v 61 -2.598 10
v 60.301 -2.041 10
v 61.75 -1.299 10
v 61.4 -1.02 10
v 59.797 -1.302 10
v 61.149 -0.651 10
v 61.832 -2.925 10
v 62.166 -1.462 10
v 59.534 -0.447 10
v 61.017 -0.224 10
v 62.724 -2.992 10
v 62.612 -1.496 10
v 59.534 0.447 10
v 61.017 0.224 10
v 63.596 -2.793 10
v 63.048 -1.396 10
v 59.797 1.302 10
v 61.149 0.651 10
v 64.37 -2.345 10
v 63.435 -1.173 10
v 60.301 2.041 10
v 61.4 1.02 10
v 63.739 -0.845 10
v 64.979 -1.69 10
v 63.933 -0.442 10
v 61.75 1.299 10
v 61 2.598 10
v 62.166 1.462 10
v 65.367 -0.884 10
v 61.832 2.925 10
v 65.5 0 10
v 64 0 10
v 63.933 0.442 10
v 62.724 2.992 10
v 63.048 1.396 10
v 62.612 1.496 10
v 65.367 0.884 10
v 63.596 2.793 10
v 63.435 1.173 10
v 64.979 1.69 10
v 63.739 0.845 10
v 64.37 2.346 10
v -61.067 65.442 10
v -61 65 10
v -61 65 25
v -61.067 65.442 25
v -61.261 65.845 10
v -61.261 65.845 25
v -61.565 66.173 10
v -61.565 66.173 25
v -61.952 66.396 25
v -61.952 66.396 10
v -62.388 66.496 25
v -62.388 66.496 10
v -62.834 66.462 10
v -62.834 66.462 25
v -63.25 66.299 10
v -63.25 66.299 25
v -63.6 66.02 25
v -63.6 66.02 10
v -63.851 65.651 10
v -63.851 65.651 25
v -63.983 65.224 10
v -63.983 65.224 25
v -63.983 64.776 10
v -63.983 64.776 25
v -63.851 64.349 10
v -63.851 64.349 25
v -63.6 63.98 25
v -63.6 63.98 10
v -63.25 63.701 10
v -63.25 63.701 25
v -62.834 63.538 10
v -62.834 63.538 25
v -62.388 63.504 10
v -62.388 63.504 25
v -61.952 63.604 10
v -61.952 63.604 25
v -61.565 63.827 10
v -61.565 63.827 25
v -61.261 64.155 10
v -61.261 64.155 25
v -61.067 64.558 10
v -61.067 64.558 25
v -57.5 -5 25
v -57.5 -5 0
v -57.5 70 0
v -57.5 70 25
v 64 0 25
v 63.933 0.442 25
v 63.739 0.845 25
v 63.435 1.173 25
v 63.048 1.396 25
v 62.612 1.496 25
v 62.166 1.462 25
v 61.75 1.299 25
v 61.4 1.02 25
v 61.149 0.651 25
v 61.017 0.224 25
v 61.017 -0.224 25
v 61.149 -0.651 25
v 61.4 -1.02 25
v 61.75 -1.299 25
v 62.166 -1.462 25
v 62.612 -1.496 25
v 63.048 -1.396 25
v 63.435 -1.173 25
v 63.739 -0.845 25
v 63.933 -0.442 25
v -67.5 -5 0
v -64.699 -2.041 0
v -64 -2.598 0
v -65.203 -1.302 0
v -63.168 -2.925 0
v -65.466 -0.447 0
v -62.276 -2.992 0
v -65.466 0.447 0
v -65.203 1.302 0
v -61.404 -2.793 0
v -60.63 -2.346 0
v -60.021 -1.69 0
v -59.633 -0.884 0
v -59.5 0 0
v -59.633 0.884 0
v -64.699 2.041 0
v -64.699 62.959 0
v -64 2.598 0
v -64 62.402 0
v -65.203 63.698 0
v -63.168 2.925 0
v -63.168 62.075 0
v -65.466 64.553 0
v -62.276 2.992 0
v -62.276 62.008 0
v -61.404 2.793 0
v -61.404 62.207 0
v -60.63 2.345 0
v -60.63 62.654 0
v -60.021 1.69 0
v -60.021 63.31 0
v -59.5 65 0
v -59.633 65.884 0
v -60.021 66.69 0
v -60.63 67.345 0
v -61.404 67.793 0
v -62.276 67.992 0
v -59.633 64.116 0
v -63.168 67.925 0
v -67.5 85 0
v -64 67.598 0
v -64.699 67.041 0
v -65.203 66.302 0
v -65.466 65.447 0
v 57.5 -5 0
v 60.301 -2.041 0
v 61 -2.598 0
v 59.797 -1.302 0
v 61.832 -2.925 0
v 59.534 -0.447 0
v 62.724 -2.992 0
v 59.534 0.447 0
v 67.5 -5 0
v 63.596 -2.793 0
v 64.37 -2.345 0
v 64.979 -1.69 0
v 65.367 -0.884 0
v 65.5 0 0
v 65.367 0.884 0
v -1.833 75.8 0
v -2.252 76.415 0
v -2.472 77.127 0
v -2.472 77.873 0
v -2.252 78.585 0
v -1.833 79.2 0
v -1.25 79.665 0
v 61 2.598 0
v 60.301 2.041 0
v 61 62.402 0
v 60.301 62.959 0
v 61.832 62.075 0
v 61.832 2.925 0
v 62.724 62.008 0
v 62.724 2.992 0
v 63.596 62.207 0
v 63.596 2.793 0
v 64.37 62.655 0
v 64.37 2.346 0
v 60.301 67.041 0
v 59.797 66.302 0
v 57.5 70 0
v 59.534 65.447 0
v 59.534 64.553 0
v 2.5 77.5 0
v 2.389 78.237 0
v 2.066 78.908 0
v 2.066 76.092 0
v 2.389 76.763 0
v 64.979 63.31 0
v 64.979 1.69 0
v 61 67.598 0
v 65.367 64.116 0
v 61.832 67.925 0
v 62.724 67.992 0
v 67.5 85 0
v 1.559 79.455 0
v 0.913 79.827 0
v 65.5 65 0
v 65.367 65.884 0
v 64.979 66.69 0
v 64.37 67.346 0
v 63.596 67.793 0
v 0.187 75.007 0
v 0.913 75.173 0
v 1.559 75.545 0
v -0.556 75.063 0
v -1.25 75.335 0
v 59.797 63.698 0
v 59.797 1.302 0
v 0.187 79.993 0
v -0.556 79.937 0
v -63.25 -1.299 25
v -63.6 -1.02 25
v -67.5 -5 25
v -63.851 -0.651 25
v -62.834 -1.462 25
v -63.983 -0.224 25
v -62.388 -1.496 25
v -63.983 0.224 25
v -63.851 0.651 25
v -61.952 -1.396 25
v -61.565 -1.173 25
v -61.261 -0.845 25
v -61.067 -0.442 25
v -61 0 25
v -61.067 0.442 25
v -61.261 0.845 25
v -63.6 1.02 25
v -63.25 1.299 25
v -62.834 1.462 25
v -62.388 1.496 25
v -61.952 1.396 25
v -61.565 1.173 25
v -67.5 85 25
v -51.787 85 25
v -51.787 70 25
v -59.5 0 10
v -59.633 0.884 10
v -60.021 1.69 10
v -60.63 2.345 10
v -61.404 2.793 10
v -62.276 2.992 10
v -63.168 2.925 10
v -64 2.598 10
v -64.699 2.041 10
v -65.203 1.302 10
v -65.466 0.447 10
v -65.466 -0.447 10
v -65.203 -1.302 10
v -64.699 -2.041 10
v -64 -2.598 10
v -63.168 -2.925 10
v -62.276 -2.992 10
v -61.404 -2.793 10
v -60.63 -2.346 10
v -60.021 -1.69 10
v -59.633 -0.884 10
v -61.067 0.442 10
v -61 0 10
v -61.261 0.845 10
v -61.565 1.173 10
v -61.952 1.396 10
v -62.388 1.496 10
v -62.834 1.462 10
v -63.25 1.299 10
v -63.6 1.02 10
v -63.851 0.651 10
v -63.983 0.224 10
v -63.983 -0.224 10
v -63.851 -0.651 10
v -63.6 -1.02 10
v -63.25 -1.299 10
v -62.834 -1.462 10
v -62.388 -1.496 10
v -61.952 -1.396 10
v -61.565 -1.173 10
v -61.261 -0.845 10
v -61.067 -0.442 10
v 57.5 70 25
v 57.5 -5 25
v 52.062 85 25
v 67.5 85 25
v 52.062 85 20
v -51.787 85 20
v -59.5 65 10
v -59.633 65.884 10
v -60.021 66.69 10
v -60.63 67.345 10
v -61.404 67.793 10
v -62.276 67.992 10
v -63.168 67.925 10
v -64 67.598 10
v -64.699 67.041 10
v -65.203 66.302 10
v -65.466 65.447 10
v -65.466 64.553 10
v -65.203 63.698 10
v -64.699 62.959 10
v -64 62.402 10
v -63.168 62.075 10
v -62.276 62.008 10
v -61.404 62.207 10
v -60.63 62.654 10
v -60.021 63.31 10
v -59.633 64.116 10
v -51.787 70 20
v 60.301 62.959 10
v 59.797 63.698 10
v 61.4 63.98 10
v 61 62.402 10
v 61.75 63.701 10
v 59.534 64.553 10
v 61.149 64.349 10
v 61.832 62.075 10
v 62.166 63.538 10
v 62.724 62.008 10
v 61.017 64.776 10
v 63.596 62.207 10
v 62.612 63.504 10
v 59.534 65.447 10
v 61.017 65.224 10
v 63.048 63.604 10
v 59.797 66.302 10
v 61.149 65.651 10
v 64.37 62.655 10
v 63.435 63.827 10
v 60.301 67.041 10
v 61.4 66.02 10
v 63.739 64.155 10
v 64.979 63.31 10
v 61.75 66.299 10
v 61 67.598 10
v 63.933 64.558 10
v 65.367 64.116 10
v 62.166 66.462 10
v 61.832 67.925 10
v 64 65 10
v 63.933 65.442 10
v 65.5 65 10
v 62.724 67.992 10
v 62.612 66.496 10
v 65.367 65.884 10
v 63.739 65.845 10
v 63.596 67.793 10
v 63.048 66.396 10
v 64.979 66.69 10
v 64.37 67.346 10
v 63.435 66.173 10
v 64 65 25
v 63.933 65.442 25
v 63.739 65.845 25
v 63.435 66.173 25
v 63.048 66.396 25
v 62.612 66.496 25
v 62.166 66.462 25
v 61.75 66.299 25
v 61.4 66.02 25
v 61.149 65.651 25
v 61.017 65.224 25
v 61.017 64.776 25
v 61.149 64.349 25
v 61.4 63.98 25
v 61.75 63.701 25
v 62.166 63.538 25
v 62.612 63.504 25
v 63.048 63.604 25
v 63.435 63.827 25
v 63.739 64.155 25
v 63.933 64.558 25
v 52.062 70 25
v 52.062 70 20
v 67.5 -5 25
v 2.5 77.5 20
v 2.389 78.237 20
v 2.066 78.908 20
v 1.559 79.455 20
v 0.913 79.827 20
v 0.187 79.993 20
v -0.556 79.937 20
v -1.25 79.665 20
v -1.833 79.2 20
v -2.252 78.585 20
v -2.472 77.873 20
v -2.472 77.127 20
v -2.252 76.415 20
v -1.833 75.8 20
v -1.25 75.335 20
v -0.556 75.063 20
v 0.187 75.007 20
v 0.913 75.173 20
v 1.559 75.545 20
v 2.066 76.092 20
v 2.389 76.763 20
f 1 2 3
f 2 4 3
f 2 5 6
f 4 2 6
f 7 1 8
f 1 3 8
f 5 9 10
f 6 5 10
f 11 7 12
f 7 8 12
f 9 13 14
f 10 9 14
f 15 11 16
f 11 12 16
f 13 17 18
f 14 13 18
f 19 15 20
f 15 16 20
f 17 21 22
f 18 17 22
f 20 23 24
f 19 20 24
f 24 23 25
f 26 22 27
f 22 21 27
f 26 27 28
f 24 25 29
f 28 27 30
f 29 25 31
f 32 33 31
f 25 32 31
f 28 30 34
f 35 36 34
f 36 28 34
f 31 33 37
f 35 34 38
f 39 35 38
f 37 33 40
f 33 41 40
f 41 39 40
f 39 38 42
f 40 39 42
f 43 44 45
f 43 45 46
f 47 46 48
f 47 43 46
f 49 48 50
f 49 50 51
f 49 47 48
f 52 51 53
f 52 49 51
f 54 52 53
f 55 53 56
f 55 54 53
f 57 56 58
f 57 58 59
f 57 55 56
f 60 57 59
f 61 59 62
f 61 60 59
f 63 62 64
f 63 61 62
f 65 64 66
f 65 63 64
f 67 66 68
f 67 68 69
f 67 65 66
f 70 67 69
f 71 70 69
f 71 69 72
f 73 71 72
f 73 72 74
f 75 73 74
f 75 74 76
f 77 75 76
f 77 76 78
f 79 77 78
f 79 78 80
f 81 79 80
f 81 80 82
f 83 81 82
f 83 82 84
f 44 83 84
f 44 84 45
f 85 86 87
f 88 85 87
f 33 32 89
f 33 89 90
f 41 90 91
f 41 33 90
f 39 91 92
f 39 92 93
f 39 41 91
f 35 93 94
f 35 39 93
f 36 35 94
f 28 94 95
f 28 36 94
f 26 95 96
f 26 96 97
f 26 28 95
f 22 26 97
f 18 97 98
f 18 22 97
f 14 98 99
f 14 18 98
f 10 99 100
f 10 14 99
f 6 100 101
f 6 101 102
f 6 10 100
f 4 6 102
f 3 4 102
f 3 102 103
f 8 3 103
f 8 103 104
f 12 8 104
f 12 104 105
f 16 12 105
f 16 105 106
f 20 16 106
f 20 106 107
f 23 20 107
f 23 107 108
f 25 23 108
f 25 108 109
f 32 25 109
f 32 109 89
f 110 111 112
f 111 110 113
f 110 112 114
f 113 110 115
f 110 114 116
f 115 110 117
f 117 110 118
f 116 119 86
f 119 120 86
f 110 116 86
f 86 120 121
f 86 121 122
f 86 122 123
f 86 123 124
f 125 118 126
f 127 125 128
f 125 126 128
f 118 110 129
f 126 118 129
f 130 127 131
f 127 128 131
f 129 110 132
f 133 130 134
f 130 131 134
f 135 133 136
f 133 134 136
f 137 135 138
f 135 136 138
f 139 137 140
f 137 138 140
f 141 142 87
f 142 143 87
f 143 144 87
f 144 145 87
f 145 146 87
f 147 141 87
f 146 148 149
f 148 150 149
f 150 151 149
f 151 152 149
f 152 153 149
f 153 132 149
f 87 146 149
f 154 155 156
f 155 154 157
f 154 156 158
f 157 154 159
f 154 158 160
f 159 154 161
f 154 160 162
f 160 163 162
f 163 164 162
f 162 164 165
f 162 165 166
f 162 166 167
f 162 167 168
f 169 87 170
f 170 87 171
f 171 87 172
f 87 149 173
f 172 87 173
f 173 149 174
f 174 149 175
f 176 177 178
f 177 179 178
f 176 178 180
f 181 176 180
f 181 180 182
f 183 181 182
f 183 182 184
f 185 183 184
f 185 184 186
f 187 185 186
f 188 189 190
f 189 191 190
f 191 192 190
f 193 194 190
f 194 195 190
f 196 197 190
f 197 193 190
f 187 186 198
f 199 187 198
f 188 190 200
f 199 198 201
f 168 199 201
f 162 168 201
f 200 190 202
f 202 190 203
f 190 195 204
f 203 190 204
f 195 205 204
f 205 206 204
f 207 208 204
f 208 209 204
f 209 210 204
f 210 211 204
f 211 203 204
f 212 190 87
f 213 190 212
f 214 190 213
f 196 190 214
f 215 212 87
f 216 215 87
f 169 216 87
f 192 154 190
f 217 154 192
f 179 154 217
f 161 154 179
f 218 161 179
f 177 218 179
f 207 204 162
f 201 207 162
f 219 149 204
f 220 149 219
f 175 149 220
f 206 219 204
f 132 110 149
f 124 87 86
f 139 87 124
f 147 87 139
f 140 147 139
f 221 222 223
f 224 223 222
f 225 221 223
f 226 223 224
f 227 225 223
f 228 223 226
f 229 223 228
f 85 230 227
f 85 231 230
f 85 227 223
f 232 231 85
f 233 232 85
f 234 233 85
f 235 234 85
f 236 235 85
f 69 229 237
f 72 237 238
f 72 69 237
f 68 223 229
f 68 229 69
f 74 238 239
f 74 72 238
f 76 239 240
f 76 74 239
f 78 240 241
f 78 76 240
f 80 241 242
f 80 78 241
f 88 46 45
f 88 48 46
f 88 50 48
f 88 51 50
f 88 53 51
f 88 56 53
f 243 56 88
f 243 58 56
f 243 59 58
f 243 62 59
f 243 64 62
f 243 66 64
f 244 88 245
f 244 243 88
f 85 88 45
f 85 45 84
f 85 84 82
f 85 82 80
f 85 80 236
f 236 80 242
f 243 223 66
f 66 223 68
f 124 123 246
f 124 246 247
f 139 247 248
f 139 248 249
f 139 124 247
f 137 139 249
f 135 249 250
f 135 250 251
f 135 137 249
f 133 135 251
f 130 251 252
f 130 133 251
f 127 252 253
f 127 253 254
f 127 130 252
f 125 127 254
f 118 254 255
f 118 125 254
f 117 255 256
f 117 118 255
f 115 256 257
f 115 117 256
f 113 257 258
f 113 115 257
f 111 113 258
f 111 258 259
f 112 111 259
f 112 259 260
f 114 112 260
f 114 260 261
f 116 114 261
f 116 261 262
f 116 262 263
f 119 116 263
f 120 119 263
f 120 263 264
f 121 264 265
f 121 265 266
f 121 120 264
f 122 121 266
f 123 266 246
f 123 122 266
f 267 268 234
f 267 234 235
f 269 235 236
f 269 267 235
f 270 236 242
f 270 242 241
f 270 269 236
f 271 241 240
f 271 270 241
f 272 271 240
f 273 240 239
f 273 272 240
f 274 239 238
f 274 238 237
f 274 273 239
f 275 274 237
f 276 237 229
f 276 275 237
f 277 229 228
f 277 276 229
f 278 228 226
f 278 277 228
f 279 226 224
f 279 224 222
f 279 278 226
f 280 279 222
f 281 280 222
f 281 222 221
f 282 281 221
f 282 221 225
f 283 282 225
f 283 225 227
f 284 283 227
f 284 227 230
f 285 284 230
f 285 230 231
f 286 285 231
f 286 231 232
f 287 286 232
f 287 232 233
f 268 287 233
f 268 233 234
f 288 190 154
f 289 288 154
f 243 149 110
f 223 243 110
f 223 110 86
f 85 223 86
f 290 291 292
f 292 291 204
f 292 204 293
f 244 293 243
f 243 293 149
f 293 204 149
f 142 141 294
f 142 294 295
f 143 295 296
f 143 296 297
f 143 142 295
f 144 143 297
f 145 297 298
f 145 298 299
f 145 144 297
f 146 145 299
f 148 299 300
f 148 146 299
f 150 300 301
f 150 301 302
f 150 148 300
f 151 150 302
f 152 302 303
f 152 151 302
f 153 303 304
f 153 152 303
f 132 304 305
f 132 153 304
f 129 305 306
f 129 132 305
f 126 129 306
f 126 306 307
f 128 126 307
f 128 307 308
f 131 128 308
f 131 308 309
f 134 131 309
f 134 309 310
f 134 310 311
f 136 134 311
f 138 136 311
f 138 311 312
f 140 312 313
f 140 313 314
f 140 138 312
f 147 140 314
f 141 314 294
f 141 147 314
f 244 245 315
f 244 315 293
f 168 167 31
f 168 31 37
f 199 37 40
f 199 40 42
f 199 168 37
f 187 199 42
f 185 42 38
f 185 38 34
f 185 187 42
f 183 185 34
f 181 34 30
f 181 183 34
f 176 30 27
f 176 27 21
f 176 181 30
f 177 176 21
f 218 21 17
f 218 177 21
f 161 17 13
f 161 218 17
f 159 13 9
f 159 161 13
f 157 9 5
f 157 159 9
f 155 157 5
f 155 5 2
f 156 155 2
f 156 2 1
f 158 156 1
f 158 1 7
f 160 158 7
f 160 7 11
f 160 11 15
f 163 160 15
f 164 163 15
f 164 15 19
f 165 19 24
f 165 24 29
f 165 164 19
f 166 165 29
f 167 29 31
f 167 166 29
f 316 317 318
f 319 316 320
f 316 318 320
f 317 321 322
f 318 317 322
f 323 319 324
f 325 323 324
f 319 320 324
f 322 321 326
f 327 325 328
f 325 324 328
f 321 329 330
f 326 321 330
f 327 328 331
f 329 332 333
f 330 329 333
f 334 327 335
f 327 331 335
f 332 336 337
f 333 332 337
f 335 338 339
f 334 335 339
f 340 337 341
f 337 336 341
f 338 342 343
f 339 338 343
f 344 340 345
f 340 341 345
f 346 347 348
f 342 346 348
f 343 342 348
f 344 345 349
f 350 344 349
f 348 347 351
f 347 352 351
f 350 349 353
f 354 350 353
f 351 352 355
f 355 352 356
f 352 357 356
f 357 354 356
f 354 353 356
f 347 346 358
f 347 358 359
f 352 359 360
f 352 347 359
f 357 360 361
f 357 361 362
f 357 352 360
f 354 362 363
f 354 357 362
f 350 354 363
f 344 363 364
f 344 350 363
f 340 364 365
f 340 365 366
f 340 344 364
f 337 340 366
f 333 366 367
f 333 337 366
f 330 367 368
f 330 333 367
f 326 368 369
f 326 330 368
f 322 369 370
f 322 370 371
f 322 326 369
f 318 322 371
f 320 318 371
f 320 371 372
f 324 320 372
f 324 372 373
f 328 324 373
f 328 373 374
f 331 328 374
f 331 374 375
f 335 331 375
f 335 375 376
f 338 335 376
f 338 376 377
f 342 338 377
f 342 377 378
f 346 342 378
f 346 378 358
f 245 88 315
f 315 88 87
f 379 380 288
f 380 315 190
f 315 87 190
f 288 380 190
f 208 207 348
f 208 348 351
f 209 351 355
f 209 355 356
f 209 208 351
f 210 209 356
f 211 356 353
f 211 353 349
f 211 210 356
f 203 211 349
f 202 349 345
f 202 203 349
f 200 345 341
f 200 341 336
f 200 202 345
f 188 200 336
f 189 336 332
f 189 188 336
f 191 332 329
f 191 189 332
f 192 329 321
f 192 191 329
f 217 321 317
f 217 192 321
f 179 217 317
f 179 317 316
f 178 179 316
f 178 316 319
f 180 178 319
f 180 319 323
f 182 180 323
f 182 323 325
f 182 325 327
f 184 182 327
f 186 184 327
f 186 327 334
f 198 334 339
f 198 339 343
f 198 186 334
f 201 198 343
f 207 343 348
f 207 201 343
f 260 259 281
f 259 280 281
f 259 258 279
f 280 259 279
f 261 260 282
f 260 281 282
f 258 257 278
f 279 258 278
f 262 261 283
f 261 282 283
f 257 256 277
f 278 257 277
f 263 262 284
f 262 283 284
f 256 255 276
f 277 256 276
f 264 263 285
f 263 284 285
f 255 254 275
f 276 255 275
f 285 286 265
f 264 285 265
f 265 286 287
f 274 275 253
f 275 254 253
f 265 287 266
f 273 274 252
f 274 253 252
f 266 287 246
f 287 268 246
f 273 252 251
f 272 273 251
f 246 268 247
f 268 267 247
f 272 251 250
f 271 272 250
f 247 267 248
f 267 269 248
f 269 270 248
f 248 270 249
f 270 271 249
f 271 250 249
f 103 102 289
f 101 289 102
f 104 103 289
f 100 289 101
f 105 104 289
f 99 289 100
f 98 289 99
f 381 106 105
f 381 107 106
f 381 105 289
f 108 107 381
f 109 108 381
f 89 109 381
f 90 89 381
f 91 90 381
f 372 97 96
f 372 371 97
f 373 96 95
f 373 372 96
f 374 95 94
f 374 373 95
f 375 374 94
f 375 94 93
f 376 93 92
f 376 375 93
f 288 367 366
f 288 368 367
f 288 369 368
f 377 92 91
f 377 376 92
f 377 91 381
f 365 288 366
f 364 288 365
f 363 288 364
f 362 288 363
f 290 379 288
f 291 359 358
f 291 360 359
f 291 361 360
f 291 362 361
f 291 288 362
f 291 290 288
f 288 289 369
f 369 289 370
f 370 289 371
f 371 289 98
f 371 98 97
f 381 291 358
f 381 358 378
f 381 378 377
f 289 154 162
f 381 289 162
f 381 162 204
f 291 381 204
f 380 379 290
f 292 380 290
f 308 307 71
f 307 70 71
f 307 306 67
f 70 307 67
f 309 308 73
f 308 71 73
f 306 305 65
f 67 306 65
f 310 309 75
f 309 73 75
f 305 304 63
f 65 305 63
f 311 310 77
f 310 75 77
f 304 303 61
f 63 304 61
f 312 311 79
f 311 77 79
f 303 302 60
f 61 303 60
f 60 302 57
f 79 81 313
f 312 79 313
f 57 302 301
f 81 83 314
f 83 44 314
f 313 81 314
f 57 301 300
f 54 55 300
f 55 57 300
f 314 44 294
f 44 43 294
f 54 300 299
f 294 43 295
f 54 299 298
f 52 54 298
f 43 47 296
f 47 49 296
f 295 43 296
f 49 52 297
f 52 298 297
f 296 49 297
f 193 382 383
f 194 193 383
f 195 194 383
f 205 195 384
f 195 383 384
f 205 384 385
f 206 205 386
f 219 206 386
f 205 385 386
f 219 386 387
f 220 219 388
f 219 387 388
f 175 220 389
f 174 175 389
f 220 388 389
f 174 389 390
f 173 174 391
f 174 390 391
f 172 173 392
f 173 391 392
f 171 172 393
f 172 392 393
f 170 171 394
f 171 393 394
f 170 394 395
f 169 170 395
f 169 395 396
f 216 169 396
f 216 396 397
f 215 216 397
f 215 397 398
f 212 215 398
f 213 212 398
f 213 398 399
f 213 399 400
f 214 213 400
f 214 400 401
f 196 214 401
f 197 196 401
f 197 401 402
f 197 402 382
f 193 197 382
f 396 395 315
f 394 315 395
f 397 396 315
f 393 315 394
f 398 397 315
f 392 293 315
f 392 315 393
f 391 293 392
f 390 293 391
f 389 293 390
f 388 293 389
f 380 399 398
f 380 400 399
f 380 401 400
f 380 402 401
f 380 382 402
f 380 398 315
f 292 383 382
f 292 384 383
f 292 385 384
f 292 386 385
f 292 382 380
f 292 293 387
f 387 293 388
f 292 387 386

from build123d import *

# Parameters (mm, degrees)
F0_W     = 114.999984
F0_H     = 15
F0_R     = 3
F0_R_2   = 1.5
F1_DEPTH = 25
F2_R     = 2.5
F3_DEPTH = 25
F2_W     = 103.84956
F2_H     = 15
F4_DEPTH = 5
F5_DEPTH = 10


with BuildPart() as f1:
    # F0 (on Top) → F1 (new body)
    with BuildSketch(Plane.XY):
        with Locations((0, 77.500006)):
            Rectangle(F0_W, F0_H)
        Polygon((-57.499992, 70.000006), (-57.499992, 85.000006), (-67.499992, 85.000006), (-67.499992, -4.999994), (-57.499992, -4.999994), align=None)
        with Locations((-62.5, -6e-06)):
            Circle(F0_R, mode=Mode.SUBTRACT)
        with Locations((-62.500006, 64.999994)):
            Circle(F0_R, mode=Mode.SUBTRACT)
        Polygon((67.499992, 85.000006), (57.499992, 85.000006), (57.499992, 70.000006), (57.499992, -4.999994), (67.499992, -4.999994), align=None)
        with Locations((62.5, 6e-06)):
            Circle(F0_R, mode=Mode.SUBTRACT)
        with Locations((62.499994, 65.000006)):
            Circle(F0_R, mode=Mode.SUBTRACT)
        with Locations((62.499994, 65.000006)):
            Circle(F0_R)
        with Locations((62.499994, 65.000006)):
            Circle(F0_R_2, mode=Mode.SUBTRACT)
        with Locations((62.5, 6e-06)):
            Circle(F0_R)
        with Locations((62.5, 6e-06)):
            Circle(F0_R_2, mode=Mode.SUBTRACT)
        with Locations((-62.5, -6e-06)):
            Circle(F0_R)
        with Locations((-62.5, -6e-06)):
            Circle(F0_R_2, mode=Mode.SUBTRACT)
        with Locations((-62.500006, 64.999994)):
            Circle(F0_R)
        with Locations((-62.500006, 64.999994)):
            Circle(F0_R_2, mode=Mode.SUBTRACT)
    extrude(amount=F1_DEPTH)

    # F2 (on face) → F3 (cut)
    with BuildSketch(Plane.XY.offset(25)):
        with Locations((0, 77.500006)):
            Circle(F2_R)
    extrude(amount=-F3_DEPTH, mode=Mode.SUBTRACT)

    # F2 (on face) → F4 (cut)
    with BuildSketch(Plane.XY.offset(25)):
        with Locations((0.137366, 77.500006)):
            Rectangle(F2_W, F2_H)
        with Locations((0, 77.500006)):
            Circle(F2_R, mode=Mode.SUBTRACT)
    extrude(amount=-F4_DEPTH, mode=Mode.SUBTRACT)

    # F0 (on Top) → F5 (cut)
    with BuildSketch(Plane.XY):
        with Locations((-62.500006, 64.999994)):
            Circle(F0_R)
        with Locations((-62.500006, 64.999994)):
            Circle(F0_R_2, mode=Mode.SUBTRACT)
        with Locations((-62.5, -6e-06)):
            Circle(F0_R)
        with Locations((-62.5, -6e-06)):
            Circle(F0_R_2, mode=Mode.SUBTRACT)
        with Locations((62.5, 6e-06)):
            Circle(F0_R)
        with Locations((62.5, 6e-06)):
            Circle(F0_R_2, mode=Mode.SUBTRACT)
        with Locations((62.499994, 65.000006)):
            Circle(F0_R)
        with Locations((62.499994, 65.000006)):
            Circle(F0_R_2, mode=Mode.SUBTRACT)
    extrude(amount=F5_DEPTH, mode=Mode.SUBTRACT)


solid = f1.part
